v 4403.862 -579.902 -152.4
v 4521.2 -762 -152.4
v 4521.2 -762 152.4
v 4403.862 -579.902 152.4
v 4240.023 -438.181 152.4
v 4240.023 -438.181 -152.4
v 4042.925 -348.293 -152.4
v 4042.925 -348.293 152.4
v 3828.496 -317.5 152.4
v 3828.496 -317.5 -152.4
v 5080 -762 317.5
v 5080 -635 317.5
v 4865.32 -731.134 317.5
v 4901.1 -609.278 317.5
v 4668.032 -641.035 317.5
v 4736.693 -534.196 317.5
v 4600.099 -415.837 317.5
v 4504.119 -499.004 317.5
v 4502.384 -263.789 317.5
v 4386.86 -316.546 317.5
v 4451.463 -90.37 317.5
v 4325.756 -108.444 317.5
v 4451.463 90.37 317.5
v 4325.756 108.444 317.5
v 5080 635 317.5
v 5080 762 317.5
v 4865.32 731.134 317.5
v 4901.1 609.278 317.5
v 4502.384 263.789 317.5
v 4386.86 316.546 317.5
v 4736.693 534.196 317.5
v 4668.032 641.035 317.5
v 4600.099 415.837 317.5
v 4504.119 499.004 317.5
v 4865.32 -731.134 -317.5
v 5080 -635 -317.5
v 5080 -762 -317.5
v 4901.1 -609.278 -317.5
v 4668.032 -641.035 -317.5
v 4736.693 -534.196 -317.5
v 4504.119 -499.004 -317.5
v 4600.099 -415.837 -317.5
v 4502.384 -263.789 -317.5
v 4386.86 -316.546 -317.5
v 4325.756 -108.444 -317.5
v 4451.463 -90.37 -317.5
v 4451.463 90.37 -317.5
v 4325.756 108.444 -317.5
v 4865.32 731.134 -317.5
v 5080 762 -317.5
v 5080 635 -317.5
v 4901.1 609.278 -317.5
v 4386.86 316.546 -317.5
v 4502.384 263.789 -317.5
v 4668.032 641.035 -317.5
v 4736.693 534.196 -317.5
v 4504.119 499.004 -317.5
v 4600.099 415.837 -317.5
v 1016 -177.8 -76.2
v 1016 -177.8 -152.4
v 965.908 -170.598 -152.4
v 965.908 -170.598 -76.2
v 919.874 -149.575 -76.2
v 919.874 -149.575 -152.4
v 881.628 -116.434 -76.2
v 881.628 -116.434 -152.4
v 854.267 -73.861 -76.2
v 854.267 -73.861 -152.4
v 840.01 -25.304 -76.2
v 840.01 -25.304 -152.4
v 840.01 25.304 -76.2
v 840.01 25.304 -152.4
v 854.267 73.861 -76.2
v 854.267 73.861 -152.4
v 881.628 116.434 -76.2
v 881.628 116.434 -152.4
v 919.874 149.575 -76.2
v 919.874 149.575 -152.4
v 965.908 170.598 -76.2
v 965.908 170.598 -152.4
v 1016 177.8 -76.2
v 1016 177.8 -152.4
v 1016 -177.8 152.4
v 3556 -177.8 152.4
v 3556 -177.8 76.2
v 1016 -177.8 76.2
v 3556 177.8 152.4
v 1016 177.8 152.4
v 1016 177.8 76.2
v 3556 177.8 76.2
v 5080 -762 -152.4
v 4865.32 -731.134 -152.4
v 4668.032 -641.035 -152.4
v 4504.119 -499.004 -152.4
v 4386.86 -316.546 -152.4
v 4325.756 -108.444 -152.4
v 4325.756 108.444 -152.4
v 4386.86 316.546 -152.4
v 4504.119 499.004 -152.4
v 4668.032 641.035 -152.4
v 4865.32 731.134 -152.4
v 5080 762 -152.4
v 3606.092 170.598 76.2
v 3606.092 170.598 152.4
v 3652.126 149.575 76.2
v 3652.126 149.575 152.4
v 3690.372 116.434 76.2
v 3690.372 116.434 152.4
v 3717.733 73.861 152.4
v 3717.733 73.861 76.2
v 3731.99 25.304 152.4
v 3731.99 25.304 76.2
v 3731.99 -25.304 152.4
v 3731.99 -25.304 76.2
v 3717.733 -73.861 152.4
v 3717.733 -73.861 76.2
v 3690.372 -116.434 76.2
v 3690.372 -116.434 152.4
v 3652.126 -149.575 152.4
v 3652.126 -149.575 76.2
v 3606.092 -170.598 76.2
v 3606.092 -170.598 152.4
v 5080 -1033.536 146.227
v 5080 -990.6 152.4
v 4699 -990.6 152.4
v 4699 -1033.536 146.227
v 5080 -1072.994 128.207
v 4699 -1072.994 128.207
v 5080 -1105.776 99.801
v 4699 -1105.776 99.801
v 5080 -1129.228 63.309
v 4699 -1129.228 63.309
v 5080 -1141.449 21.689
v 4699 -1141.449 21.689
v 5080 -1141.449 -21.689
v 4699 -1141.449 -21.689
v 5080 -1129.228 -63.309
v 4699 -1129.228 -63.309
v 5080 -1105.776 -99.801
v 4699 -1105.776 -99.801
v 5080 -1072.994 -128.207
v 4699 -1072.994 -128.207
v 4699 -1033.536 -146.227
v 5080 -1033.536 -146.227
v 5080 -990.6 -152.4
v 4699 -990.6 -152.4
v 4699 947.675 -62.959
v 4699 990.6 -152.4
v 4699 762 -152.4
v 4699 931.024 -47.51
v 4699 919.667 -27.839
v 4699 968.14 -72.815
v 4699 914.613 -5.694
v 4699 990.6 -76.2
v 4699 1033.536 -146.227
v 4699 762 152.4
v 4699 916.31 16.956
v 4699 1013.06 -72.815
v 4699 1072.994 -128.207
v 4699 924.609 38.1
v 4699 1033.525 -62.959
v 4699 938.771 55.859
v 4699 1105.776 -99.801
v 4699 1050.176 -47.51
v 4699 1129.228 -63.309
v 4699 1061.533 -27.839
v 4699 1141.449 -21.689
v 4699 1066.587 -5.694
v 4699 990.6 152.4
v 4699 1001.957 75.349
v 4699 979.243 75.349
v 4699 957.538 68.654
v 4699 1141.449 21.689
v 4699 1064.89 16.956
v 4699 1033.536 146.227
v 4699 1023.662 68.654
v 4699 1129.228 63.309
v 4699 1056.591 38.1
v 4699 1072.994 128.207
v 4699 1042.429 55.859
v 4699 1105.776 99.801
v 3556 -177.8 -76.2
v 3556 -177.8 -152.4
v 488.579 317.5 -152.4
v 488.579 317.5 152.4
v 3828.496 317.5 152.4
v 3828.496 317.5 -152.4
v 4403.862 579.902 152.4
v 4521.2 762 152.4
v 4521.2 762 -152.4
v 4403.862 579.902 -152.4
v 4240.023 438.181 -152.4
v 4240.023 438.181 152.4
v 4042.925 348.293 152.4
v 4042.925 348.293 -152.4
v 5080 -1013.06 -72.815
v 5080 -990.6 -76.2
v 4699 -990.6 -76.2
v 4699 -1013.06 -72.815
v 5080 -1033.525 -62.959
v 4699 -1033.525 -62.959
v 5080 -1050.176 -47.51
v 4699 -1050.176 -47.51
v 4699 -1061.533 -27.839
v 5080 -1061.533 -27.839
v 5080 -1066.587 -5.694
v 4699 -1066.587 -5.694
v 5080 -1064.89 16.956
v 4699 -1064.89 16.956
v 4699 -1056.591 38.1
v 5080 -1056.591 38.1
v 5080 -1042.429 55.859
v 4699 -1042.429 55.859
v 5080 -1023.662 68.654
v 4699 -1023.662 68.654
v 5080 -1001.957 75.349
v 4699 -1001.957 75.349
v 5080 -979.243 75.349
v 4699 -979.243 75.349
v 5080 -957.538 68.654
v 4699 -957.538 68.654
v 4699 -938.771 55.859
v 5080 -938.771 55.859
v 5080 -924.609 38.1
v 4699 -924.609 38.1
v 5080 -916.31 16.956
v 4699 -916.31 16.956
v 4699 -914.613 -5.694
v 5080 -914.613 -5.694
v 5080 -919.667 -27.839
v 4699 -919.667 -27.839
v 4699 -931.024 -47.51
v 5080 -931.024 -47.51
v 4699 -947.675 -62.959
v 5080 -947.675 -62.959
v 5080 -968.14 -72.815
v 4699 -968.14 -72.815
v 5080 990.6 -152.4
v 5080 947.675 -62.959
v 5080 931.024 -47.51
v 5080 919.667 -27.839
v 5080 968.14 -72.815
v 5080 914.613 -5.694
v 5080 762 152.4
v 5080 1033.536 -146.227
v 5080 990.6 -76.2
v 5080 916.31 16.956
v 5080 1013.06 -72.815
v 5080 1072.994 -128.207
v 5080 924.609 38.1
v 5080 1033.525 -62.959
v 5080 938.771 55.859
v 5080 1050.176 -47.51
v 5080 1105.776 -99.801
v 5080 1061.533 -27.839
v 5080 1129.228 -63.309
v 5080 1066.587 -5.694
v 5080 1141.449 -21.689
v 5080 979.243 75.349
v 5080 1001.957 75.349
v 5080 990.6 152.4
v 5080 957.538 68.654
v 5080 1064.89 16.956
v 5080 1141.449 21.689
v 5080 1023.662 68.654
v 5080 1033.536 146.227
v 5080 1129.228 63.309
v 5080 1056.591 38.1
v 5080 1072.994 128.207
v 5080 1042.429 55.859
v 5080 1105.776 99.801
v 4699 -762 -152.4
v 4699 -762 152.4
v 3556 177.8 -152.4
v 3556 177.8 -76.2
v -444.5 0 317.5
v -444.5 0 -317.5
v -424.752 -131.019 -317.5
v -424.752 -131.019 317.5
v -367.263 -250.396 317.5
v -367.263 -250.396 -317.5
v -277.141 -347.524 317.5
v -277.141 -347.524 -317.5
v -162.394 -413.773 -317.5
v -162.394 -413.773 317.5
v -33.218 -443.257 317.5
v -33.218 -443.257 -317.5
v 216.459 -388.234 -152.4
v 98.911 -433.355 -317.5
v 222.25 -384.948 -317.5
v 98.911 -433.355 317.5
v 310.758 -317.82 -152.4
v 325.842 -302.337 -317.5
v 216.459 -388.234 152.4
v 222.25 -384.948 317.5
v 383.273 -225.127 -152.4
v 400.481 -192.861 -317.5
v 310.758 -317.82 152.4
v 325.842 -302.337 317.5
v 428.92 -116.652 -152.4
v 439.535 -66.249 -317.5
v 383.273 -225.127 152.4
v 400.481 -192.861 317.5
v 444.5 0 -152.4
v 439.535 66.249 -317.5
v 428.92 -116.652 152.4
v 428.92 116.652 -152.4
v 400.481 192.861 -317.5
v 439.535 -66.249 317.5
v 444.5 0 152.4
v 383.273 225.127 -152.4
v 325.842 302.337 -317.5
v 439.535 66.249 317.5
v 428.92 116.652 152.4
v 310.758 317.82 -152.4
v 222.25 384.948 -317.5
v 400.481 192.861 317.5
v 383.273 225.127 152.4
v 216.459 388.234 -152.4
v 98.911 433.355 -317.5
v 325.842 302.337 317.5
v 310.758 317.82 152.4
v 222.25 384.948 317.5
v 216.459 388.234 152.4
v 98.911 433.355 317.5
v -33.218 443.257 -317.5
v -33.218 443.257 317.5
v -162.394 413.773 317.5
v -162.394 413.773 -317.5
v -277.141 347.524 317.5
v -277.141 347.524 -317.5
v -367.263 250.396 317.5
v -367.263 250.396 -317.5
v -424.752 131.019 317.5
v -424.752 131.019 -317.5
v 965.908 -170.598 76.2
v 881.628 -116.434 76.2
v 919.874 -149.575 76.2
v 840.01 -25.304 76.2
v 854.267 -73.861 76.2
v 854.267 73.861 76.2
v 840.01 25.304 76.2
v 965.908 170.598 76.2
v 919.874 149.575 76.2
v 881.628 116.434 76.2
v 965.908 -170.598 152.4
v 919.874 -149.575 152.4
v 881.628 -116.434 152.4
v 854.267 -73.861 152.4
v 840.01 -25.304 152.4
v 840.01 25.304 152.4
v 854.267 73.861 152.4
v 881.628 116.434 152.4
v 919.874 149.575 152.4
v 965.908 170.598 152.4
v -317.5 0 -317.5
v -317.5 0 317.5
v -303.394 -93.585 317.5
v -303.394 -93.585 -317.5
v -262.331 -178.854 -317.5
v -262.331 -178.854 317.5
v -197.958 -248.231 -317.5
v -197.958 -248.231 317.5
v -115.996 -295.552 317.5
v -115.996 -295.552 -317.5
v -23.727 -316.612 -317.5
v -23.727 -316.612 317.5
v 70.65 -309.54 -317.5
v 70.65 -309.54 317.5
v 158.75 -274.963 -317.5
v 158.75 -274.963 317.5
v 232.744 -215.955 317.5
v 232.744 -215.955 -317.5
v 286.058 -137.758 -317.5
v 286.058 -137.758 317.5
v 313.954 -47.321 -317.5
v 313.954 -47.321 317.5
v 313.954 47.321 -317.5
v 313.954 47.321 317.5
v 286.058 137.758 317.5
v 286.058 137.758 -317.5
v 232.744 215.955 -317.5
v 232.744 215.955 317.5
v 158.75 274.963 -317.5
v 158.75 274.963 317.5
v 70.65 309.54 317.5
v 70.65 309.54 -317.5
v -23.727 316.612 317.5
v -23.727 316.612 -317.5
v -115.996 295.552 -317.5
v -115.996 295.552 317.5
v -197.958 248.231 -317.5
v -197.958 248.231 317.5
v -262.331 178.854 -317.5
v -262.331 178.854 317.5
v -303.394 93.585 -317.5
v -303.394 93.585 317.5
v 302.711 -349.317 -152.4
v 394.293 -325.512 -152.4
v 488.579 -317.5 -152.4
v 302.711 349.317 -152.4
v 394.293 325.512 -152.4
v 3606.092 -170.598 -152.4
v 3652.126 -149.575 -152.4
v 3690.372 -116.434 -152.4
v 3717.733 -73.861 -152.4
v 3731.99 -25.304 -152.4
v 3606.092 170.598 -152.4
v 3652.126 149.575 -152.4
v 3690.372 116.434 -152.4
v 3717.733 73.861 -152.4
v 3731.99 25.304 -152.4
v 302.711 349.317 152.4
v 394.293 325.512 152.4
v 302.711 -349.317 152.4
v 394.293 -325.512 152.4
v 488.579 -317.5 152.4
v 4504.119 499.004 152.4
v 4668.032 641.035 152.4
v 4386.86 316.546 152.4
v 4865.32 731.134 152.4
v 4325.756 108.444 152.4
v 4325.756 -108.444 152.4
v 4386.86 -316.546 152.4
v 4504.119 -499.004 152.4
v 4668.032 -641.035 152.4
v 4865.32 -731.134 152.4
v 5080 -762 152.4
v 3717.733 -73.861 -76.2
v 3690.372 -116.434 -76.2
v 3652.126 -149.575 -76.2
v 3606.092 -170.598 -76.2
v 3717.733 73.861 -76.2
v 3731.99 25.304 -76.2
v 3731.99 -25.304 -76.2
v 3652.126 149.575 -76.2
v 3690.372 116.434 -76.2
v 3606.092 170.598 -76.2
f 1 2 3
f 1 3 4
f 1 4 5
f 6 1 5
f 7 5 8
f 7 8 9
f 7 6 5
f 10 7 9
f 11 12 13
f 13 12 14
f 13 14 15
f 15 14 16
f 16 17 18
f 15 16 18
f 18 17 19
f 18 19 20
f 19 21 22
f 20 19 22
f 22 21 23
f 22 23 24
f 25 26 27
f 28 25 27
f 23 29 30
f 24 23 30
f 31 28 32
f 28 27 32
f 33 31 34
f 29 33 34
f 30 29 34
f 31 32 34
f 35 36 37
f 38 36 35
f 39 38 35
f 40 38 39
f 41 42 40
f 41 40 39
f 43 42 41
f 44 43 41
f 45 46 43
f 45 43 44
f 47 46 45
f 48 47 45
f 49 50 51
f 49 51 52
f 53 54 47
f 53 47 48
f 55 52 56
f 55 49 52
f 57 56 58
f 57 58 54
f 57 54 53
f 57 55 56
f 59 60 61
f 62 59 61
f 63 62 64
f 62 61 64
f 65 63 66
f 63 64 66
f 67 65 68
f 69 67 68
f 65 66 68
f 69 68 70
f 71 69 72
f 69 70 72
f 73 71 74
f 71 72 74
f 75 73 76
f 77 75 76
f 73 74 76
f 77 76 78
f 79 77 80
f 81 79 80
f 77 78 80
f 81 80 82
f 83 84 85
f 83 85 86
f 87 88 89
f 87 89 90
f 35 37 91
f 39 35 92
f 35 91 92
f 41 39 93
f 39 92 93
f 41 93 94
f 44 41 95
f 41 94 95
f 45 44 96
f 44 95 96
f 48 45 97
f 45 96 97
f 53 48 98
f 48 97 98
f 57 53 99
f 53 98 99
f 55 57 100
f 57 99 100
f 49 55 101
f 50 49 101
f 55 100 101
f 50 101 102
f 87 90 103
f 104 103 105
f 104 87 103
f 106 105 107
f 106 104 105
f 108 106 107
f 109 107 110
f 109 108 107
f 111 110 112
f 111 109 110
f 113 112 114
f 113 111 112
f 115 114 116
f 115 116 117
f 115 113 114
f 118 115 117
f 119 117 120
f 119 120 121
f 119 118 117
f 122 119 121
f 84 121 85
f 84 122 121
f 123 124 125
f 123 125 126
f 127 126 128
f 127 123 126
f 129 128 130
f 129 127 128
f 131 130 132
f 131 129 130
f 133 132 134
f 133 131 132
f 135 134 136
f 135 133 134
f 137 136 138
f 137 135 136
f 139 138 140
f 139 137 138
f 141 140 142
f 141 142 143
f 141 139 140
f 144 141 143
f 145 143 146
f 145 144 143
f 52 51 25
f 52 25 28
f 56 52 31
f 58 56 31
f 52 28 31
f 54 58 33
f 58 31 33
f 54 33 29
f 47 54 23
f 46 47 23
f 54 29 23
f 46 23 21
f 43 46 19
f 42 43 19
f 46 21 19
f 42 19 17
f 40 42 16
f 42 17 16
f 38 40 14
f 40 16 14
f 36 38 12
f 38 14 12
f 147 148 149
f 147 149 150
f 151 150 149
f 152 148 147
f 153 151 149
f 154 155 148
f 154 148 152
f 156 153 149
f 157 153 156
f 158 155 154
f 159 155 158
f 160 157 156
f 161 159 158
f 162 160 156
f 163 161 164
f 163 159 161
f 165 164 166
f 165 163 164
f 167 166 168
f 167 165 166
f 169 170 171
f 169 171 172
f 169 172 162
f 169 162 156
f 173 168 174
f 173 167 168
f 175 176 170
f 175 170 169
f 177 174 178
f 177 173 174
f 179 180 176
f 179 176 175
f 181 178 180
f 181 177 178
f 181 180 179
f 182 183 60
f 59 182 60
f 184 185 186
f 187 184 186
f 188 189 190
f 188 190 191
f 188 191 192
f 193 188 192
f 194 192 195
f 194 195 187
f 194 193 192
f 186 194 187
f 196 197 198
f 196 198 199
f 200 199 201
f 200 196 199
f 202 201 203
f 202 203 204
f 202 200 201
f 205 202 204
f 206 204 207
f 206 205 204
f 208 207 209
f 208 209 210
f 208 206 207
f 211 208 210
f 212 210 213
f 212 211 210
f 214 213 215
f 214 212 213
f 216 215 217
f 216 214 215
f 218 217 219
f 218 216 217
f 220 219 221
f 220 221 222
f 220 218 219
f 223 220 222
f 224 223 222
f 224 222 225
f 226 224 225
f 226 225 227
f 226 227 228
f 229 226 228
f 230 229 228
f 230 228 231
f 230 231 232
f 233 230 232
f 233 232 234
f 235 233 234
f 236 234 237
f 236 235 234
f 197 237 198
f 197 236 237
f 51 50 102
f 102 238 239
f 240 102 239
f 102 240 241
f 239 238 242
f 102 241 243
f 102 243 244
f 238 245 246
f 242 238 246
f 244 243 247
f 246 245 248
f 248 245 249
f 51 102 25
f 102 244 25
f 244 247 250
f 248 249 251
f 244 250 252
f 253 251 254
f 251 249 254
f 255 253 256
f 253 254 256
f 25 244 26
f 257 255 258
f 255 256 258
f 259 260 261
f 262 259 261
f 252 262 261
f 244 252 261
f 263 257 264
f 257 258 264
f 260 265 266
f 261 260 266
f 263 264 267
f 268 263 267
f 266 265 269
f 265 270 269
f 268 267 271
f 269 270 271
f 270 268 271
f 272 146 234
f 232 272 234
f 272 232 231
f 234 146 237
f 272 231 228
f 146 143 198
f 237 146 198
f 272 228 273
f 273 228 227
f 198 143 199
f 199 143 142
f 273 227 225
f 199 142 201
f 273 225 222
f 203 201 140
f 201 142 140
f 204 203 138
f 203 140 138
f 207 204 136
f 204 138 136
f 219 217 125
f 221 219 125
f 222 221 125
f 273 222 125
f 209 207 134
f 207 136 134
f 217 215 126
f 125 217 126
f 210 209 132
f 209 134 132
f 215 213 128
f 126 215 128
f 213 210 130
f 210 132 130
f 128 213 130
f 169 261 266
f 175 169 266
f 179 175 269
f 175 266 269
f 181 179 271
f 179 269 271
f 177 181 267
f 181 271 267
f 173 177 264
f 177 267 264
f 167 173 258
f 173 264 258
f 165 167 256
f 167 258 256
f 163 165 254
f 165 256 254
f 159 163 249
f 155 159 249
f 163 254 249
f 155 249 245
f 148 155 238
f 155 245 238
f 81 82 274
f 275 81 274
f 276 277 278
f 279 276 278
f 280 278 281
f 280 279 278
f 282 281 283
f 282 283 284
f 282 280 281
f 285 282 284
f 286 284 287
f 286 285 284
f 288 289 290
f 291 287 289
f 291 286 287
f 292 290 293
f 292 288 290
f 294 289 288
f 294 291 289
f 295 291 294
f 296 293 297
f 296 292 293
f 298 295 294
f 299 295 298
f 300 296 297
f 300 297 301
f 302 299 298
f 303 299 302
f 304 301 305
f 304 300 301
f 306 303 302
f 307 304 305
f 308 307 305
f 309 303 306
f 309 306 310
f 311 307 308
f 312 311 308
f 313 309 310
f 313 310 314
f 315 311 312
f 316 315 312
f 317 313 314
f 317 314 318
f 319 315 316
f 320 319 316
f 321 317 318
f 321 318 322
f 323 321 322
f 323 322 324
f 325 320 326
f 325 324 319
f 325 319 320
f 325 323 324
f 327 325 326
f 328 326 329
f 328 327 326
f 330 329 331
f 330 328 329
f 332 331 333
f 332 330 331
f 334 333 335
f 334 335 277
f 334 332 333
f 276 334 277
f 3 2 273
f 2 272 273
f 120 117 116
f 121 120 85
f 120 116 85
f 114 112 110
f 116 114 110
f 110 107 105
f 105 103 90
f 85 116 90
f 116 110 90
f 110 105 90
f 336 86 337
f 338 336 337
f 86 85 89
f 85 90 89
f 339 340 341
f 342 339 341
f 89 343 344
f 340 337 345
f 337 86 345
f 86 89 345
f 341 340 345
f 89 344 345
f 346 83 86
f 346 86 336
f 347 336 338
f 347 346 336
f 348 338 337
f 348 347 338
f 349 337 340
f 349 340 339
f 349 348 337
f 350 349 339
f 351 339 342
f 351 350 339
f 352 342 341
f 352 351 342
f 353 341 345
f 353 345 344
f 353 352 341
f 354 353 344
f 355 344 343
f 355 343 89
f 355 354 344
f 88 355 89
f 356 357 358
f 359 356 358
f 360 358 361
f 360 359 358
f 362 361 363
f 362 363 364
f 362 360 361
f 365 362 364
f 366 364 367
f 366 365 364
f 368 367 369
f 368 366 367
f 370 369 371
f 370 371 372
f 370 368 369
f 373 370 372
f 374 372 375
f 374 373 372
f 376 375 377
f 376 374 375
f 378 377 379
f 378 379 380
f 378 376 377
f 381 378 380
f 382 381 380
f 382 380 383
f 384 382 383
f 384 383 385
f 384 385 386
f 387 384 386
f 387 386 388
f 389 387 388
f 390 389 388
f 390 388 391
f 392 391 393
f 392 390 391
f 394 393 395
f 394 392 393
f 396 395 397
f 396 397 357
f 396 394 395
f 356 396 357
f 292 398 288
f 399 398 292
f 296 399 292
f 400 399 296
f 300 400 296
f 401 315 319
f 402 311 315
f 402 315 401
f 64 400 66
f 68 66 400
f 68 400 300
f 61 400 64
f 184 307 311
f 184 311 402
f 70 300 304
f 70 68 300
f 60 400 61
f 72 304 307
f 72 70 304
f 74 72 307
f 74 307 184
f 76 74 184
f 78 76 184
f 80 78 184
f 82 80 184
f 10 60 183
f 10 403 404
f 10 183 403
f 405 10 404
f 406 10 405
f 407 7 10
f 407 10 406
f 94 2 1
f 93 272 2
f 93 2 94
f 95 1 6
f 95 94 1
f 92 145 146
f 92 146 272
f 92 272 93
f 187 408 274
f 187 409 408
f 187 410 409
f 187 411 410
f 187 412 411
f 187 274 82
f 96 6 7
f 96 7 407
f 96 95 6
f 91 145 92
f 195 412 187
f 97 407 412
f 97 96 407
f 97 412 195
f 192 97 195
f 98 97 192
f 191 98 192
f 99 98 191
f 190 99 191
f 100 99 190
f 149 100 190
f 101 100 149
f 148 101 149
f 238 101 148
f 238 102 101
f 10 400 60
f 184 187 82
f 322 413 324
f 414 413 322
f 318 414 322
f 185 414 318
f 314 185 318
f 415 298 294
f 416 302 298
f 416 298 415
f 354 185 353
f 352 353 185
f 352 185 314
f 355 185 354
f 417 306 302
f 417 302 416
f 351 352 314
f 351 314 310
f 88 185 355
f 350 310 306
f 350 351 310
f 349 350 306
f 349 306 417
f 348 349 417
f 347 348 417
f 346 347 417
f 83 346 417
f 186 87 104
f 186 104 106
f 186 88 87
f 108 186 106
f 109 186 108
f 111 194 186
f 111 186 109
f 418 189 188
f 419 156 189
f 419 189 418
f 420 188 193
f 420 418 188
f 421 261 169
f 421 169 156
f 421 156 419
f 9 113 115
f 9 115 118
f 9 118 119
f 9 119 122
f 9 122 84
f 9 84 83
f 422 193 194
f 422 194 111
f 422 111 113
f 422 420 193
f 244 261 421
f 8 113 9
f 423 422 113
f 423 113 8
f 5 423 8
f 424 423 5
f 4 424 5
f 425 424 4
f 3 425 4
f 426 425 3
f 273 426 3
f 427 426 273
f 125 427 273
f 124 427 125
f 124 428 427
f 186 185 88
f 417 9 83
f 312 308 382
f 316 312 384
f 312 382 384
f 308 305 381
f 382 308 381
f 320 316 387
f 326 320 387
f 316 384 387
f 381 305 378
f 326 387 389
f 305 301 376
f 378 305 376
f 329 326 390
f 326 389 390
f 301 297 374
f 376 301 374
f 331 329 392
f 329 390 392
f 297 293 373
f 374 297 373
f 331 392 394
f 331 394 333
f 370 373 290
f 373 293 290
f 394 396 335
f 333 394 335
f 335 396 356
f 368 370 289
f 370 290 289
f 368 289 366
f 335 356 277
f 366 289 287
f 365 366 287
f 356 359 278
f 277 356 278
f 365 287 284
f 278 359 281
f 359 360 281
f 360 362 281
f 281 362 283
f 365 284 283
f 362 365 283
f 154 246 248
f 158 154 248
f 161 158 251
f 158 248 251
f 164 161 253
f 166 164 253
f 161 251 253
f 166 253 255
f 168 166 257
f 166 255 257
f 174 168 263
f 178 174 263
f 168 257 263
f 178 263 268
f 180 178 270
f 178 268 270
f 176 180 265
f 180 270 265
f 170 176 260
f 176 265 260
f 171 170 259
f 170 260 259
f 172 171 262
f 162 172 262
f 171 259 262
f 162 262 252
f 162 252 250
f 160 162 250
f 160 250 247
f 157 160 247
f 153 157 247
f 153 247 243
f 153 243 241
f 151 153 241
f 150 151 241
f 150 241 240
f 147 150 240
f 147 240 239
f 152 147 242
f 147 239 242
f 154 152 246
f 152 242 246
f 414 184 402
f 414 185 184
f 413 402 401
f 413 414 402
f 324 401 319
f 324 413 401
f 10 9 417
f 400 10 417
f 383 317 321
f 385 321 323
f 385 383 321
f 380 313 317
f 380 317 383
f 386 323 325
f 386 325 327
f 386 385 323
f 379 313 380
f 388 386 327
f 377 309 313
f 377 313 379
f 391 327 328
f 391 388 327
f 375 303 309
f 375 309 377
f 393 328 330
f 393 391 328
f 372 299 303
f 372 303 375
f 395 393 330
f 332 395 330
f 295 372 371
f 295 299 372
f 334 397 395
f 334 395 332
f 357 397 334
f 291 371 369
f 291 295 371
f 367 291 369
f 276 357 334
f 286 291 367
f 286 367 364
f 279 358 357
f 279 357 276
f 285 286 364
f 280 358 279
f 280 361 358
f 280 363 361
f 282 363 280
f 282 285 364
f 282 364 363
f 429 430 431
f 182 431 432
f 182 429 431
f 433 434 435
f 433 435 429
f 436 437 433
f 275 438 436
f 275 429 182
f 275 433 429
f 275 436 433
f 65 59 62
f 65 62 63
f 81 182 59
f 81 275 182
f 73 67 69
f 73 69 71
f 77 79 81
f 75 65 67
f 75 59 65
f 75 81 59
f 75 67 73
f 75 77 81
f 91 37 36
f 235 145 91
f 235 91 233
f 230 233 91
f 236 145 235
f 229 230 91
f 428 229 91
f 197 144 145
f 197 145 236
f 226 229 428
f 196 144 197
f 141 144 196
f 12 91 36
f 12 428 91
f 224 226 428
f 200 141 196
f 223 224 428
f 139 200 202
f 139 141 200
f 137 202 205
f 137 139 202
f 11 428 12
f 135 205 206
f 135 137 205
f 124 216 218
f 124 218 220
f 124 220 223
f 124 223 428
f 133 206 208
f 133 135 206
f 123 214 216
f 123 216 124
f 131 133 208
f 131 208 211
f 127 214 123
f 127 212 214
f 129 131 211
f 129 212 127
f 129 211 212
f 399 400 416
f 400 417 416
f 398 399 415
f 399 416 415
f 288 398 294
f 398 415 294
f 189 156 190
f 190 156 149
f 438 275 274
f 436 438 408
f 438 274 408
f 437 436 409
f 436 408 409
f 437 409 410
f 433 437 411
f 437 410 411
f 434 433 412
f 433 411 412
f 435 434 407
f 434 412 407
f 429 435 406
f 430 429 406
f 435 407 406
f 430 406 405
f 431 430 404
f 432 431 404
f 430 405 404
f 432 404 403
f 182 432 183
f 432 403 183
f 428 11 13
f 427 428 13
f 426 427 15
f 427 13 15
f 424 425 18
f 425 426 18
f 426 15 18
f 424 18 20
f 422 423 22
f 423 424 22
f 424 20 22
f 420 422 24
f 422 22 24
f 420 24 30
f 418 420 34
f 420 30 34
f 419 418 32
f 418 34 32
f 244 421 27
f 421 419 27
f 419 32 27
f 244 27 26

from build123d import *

# Parameters (mm, degrees)
SKETCH1_R             = 444.5
SKETCH1_R_2           = 317.5
BOSS_EXTRUDE1_DEPTH   = 317.5
BOSS_EXTRUDE1_2_DEPTH = 317.5
BOSS_EXTRUDE2_DEPTH   = 152.4
FILLET1_R             = 558.8
FILLET2_R             = 762
SKETCH4_R             = 76.2
BOSS_EXTRUDE3_DEPTH   = 381
CUT_EXTRUDE1_DEPTH    = 76.2


with BuildPart() as part:
    # Sketch1 → Boss-Extrude1 (new, symmetric)
    with BuildSketch(Plane.XY):
        with Locations(Location((0, 0, 0), (0, 0, 180))):
            Circle(SKETCH1_R)
        with Locations(Location((0, 0, 0), (0, 0, 180))):
            Circle(SKETCH1_R_2, mode=Mode.SUBTRACT)
    extrude(amount=BOSS_EXTRUDE1_DEPTH, both=True)



with BuildPart() as body_2:
    # Sketch1 → Boss-Extrude1 2 (new, symmetric)
    with BuildSketch(Plane.XY):
        with BuildLine():
            Line((5080, 762), (5080, 635))
            ThreePointArc((5080, 635), (4445, 0), (5080, -635))
            Line((5080, -635), (5080, -762))
            ThreePointArc((5080, -762), (4318, 0), (5080, 762))
        make_face()
    extrude(amount=BOSS_EXTRUDE1_2_DEPTH, both=True)


with BuildPart() as part_1:
    add(part.part)

    add(body_2.part)  # Boss-Extrude2 merges body 2
    # Sketch2 → Boss-Extrude2 (add, symmetric)
    with BuildSketch(Plane.XY):
        with BuildLine():
            Line((311.085197333, 317.5), (4318, 317.5))
            Line((4318, 317.5), (4521.2, 762))
            Line((4521.2, 762), (5080, 762))
            ThreePointArc((5080, 762), (4318, 0), (5080, -762))
            Line((5080, -762), (4521.2, -762))
            Line((4521.2, -762), (4318, -317.5))
            Line((4318, -317.5), (311.085197333, -317.5))
            ThreePointArc((311.085197333, -317.5), (444.5, 0), (311.085197333, 317.5))
        make_face()
    extrude(amount=BOSS_EXTRUDE2_DEPTH, both=True)

    # Fillet1
    fillet1_edges = [part_1.edges().sort_by_distance(p)[0] for p in [
        (311.085197333, 317.5, 0),
        (311.085197333, -317.5, 0),
    ]]
    fillet(fillet1_edges, radius=FILLET1_R)

    # Fillet2
    # the kernel refuses this fillet: 762 mm, written as the material it adds along each edge
    with BuildSketch(Plane(origin=(4318, -317.5, -152.4), x_dir=(-1, 0, 0), z_dir=(0, 0, 1))) as fillet2_piece_1_section:
        with BuildLine():
            CenterArc((FILLET2_R * 0.642393223137, FILLET2_R), FILLET2_R, 204.567171321, 65.432828679)
            Line((-FILLET2_R * 0.267081252449, FILLET2_R * 0.584240239732), (0, 0))
            Line((0, 0), (FILLET2_R * 0.642393223137, 0))
        make_face()
    fillet2_piece_1 = extrude(amount=304.8, mode=Mode.PRIVATE)
    fillet2_piece_1 = split(fillet2_piece_1, bisect_by=Plane(origin=(4255.635899042, -762, 0), z_dir=(0, 1, 0)), keep=Keep.TOP, mode=Mode.PRIVATE)
    add(fillet2_piece_1)
    with BuildSketch(Plane(origin=(4318, 317.5, 152.4), x_dir=(0.4157597602677956, 0.9094744755857996, 0), z_dir=(0, 0, -1))) as fillet2_piece_2_section:
        with BuildLine():
            CenterArc((FILLET2_R * 0.642393223137, -FILLET2_R), FILLET2_R, 90, 65.432828679)
            Line((-FILLET2_R * 0.267081252449, -FILLET2_R * 0.584240239732), (0, 0))
            Line((0, 0), (FILLET2_R * 0.642393223137, 0))
        make_face()
    fillet2_piece_2 = extrude(amount=304.8, mode=Mode.PRIVATE)
    fillet2_piece_2 = split(fillet2_piece_2, bisect_by=Plane(origin=(4255.635899042, 762, 0), z_dir=(0, -1, 0)), keep=Keep.TOP, mode=Mode.PRIVATE)
    add(fillet2_piece_2)

    # Sketch4 → Boss-Extrude3 (add)
    with BuildSketch(Plane(origin=(5080, 0, 0), x_dir=(0, 0, -1), z_dir=(1, 0, 0))):
        with BuildLine():
            Line((152.4, 990.6), (152.4, 762))
            Line((152.4, 762), (-152.4, 762))
            Line((-152.4, 762), (-152.4, 990.6))
            ThreePointArc((-152.4, 990.6), (0, 1143), (152.4, 990.6))
        make_face()
        with Locations((0, 990.6)):
            Circle(SKETCH4_R, mode=Mode.SUBTRACT)
    boss_extrude3 = extrude(amount=-BOSS_EXTRUDE3_DEPTH)

    # Mirror1: Boss-Extrude3 across plane
    add(boss_extrude3.mirror(Plane.ZX))

    # Sketch5 → Cut-Extrude1 (cut)
    with BuildSketch(Plane.XY.offset(152.4)):
        with BuildLine():
            Line((3556, -177.8), (1016, -177.8))
            ThreePointArc((1016, -177.8), (838.2, 0), (1016, 177.8))
            Line((1016, 177.8), (3556, 177.8))
            ThreePointArc((3556, 177.8), (3733.8, 0), (3556, -177.8))
        make_face()
    cut_extrude1 = extrude(amount=-CUT_EXTRUDE1_DEPTH, mode=Mode.SUBTRACT)

    # Mirror2: Cut-Extrude1 across plane
    add(cut_extrude1.mirror(Plane.XY), mode=Mode.SUBTRACT)


solid = part_1.part
